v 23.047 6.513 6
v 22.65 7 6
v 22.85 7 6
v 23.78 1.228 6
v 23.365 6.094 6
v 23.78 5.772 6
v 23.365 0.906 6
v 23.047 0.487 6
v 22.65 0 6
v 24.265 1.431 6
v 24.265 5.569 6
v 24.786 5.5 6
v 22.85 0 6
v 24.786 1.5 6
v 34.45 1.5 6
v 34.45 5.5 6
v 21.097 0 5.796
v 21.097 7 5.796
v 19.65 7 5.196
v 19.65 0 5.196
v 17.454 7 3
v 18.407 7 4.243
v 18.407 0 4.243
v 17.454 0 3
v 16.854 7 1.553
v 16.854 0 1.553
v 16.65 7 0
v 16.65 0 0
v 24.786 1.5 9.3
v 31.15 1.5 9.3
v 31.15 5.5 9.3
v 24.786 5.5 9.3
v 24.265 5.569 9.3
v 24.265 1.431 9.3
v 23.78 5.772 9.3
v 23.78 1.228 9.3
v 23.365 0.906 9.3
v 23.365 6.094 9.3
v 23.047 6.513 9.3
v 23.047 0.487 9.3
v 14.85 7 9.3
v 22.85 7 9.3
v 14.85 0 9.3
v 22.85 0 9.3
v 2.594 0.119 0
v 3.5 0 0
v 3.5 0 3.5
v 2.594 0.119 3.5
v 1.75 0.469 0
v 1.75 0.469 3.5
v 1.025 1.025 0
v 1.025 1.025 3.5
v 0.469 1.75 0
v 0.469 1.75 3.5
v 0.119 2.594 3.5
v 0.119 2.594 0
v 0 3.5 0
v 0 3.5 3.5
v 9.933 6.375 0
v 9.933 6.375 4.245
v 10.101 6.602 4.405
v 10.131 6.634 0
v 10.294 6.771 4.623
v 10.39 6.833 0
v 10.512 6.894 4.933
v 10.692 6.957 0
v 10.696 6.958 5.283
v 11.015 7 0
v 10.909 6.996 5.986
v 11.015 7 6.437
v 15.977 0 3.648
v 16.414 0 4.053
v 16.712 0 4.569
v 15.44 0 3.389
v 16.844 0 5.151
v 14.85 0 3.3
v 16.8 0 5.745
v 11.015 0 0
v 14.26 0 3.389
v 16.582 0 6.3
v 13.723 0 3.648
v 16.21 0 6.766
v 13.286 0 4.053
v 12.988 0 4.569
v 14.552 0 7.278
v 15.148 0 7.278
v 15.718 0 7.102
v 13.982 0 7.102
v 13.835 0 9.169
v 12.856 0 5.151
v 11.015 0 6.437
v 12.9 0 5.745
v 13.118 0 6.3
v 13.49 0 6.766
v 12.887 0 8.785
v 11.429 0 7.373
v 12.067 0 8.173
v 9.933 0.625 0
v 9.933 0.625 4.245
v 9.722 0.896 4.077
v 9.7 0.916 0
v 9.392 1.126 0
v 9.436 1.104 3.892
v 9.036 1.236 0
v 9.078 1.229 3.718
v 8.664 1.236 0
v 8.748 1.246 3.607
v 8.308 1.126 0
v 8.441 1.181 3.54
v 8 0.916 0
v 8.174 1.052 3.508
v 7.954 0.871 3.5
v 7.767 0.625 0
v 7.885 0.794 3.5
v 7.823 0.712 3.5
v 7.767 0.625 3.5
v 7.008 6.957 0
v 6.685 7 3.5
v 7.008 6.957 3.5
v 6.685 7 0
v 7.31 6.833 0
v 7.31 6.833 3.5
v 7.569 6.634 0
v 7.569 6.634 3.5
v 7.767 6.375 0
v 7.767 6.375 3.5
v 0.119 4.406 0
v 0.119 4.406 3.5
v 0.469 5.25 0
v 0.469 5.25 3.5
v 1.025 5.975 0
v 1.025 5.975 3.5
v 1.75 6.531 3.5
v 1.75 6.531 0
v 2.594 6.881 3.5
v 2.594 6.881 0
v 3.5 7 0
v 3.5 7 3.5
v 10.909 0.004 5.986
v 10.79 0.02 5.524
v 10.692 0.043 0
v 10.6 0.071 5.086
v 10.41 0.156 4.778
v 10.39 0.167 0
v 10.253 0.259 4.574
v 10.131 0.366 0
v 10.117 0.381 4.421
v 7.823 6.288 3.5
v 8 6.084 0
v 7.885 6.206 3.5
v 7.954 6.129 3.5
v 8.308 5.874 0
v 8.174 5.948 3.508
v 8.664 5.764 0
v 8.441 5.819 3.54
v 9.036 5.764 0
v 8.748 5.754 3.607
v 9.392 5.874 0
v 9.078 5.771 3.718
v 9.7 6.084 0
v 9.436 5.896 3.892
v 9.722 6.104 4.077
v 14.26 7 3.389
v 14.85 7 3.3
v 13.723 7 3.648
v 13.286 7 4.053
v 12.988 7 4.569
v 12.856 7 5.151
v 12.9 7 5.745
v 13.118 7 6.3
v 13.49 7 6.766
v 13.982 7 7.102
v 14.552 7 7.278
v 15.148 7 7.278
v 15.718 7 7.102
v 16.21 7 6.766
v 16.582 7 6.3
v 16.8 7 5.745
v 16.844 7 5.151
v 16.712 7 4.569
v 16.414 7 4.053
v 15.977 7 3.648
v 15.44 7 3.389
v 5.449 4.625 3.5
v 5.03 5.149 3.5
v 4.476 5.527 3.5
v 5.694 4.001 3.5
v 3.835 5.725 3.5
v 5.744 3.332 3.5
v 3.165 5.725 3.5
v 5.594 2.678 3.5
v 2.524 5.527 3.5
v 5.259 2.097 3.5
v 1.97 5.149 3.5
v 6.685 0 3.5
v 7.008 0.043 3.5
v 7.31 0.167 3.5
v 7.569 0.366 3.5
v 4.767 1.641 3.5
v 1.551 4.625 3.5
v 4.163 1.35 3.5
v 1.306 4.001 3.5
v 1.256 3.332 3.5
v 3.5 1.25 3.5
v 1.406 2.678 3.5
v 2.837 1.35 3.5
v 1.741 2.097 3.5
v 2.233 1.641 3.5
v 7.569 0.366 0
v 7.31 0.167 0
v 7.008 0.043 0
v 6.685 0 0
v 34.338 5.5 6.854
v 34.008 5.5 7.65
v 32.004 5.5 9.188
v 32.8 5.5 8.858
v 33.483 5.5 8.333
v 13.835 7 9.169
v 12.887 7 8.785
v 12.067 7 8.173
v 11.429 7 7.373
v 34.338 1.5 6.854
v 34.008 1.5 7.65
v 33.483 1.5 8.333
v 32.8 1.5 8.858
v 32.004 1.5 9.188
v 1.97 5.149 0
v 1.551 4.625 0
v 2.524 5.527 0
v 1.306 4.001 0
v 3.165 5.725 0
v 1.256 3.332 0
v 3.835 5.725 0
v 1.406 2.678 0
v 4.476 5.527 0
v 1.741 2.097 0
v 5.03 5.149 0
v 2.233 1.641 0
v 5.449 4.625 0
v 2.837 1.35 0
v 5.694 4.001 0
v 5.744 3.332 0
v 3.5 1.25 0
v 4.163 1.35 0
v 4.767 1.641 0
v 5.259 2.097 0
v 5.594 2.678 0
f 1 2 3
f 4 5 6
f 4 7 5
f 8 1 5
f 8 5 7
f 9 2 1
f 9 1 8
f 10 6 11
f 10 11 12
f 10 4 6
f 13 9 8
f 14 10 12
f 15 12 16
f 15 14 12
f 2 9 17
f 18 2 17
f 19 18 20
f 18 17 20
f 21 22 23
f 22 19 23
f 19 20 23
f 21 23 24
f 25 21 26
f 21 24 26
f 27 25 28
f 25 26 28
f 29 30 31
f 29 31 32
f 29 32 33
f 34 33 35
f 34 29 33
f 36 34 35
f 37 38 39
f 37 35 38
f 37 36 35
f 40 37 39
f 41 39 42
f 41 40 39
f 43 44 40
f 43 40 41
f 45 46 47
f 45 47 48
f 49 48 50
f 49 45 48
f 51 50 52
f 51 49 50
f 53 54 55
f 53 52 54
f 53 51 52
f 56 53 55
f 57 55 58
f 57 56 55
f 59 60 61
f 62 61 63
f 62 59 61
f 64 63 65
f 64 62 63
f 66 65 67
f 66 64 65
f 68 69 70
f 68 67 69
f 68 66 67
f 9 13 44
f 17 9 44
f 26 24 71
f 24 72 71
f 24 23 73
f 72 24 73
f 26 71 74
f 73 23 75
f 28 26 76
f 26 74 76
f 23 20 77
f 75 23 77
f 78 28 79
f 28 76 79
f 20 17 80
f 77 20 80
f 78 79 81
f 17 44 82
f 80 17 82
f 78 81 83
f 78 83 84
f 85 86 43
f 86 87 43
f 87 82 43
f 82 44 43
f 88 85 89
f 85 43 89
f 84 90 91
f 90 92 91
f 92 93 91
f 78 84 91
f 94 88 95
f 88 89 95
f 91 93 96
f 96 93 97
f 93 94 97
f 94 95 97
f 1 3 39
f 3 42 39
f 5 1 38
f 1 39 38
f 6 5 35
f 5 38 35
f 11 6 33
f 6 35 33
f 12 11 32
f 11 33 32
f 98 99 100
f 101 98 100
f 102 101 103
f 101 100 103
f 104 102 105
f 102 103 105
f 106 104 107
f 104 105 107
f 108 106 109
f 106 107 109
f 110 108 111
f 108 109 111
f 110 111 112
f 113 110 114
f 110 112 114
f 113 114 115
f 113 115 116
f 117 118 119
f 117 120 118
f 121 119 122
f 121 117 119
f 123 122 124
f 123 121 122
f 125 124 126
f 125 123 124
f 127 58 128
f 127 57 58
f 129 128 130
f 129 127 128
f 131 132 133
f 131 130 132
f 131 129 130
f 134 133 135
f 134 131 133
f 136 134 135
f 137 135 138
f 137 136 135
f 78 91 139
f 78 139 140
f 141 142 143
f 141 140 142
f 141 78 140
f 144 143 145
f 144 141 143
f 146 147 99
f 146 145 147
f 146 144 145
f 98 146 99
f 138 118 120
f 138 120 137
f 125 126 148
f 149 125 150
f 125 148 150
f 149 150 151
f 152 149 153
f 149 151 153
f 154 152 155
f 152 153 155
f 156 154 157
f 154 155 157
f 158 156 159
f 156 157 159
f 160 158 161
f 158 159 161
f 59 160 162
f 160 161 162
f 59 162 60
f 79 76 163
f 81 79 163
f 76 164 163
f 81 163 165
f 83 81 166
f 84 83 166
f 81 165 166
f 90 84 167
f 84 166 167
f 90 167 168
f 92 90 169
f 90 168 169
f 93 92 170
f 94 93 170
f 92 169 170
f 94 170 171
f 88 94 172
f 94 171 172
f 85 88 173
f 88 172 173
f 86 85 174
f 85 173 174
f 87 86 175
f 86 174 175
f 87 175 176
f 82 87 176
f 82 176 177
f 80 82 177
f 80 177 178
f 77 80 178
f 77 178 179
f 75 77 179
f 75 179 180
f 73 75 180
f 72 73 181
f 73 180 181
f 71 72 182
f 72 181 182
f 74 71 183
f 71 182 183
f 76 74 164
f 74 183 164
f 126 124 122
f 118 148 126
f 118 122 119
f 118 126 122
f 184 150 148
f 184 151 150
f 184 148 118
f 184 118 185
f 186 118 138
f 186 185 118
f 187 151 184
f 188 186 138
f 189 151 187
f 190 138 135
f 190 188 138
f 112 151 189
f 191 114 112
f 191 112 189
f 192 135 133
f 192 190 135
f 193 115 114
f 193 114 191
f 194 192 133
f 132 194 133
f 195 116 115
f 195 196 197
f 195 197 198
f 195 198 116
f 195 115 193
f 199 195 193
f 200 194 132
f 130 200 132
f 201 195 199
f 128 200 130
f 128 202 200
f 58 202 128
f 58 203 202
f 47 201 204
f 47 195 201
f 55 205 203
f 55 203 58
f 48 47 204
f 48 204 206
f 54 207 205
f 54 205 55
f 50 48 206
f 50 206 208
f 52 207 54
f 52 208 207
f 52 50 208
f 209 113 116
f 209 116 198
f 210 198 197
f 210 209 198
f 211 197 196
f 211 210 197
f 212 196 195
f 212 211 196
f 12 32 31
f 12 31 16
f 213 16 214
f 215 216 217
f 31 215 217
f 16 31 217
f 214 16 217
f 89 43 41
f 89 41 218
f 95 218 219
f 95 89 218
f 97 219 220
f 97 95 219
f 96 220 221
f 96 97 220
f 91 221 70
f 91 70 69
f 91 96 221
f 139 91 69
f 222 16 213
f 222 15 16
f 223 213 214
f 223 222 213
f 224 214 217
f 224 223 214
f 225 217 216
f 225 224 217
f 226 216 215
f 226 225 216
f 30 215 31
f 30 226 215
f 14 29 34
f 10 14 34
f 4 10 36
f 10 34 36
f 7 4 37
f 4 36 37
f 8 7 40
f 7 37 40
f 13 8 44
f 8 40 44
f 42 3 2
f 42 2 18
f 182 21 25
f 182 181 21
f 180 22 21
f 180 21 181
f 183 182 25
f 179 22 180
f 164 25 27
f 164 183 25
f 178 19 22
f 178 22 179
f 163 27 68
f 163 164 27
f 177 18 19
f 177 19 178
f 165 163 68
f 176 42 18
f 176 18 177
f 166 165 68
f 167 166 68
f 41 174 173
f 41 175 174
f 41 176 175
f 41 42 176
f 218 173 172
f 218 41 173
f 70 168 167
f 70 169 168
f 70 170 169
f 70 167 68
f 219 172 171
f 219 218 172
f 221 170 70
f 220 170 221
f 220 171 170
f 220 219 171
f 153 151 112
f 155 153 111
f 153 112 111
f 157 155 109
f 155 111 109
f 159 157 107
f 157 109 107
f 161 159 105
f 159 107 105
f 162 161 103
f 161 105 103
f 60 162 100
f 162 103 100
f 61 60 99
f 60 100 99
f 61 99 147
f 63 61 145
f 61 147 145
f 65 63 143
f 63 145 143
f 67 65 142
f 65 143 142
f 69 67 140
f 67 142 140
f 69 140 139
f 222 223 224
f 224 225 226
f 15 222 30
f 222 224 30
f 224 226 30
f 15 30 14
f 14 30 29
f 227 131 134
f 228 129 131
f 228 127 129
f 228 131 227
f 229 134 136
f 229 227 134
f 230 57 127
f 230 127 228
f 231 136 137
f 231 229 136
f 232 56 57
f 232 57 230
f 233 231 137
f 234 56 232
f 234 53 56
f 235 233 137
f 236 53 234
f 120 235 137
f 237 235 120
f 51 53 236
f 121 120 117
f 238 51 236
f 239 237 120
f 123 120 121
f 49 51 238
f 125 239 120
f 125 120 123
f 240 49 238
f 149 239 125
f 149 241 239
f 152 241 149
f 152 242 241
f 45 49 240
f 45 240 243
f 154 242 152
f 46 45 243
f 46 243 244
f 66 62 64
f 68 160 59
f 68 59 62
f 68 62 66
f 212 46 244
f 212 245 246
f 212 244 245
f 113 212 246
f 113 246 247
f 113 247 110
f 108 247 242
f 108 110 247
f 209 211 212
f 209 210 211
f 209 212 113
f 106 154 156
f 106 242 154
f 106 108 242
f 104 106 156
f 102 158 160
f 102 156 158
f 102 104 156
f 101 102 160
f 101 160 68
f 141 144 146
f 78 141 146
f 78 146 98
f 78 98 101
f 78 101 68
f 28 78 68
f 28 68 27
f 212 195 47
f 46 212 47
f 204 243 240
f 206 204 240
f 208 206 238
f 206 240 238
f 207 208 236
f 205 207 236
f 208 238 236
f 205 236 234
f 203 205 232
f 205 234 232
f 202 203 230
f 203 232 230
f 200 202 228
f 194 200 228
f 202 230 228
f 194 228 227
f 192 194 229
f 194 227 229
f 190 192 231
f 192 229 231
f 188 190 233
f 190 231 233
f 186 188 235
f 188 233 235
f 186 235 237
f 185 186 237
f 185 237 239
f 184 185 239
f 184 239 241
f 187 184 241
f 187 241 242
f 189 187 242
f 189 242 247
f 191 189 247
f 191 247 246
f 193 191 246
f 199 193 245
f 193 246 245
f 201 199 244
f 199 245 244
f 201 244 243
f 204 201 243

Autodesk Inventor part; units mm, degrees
ref_plane "YZ Plane" through (0, 0, 0) normal (1, 0, 0) x (0, 1, 0)
ref_plane "XY Plane" through (0, 0, 0) normal (0, 0, 1) x (1, 0, 0)
sketch "Skizze1" plane through (0, 0, 0) normal (0, 1, 0) x (-1, 0, 0)
  line L0 (0, 0) -> (-16.65, 0)
  arc A0 (-16.65, 0) -> (-22.65, 6) centre (-22.65, 0) ccw
  line L1 (-22.65, 6) -> (-34.45, 6)
  arc A1 (-31.15, 9.3) -> (-34.45, 6) centre (-31.15, 6) ccw
  line L2 (-31.15, 9.3) -> (-14.85, 9.3)
  arc A2 (-10.9092, 5.9857) -> (-14.85, 9.3) centre (-14.85, 5.3) ccw
  arc A3 (-10.9092, 5.9857) -> (-7.9536, 3.5) centre (-7.9536, 6.5) ccw
  line L3 (-7.9536, 3.5) -> (0, 3.5)
  line L4 (0, 3.5) -> (0, 0)
  dimension "d0" = 3
  dimension "d1" = 4
  dimension "d2" = 3.5
  dimension "d3" = 7.8
  dimension "d4" = 3.3
  dimension "d5" = 6
  dimension "d6" = 14.85
  dimension "d7" = 19.6
extrude "Extrusion1" add sketch "Skizze1" along normal blind 7
sketch "Skizze3" plane through (0, 0, 0) normal (0, -1, 0) x (1, 0, 0)
  arc A0 (14.85, 9.3) -> (10.9092, 5.9857) centre (14.85, 5.3) ccw projected
  point P0 (0, 0)
hole "Bohrung1" at (14.85, 0, 5.3) direction (0, 1, 0) diameter 4 depth 7
sketch "Skizze4" plane through (14.85, 0, 9.3) normal (0, 0, 1) x (1, 0, 0)
  line L0 (-2, 7) -> (2, 7) projected
  line L1 (2, 0) -> (-2, 0) projected
  line L2 (0, 0) -> (0, 7) construction
  line L3 (0, 7) -> (0, 0) construction
  line L4 (1.8, 0) -> (-14.85, 0) projected
  arc A0 (-4.75, 0) -> (-7.25, 0) centre (-6, 0) ccw
  dimension "d17" = 1.25
  dimension "d18" = 6
extrude "Extrusion2" cut sketch "Skizze4" against normal up to surface (9.3 mm away)
fillet "Rundung1" radius 1.25 2 edges at (10.1, 0, 2.202) (7.6, 0, 1.75)
ref_plane "Arbeitsebene1" through (0, 3.5, 0) normal (0, 1, 0) x (-1, 0, 0)
mirror "Spiegeln1" about plane through (0, 3.5, 0) normal (0, 1, 0) of "Extrusion2", "Rundung1"
fillet "Rundung2" radius 3.5 2 edges at (0, 0, 1.75) (0, 7, 1.75)
sketch "Skizze5" plane through (7.9536, 0.8712, 3.5) normal (0, 0, 1) x (1, 0, 0)
  arc A0 (-4.4536, 6.1288) -> (-4.4536, -0.8712) centre (-4.4536, 2.6288) ccw projected
  point P0 (-7.9536, -0.8712)
hole "Bohrung2" at (3.5, 3.5, 3.5) direction (0, 0, -1) diameter 4.5 depth 3.5
sketch "Skizze6" plane through (14.85, 0, 9.3) normal (0, 0, 1) x (1, 0, 0)
  line L0 (0, 0) -> (16.3, 0) projected
  line L1 (16.3, 0) -> (16.3, 7) projected
  line L2 (0, 7) -> (16.3, 7) projected
  line L3 (0, 0) -> (0, 7) projected
  line L4 (16.3, 0) -> (19.6, 0) projected
  line L5 (19.6, 0) -> (19.6, 7) projected
  line L6 (16.3, 7) -> (19.6, 7) projected
  line L7 (16.3, 0) -> (16.3, 7) projected
  line L8 (8, 5.5) -> (19.6, 5.5)
  line L9 (8, 5.5) -> (8, 7)
  point P0 (-14.85, 0)
  point P1 (8, 6.25)
  dimension "d32" = 1.5
  dimension "d38" = 8
extrude "Extrusion5" cut sketch "Skizze6" against normal up to surface (3.3 mm away) contours L8 L9 L2 L1 | L1 L6 L5 L8
mirror "Spiegeln2" about plane through (0, 3.5, 0) normal (0, 1, 0) of "Extrusion5"
fillet "Rundung3" radius 2 2 edges at (22.85, 5.5, 7.65) (22.85, 1.5, 7.65)
properties part number "KippHebel" material "Blei"
